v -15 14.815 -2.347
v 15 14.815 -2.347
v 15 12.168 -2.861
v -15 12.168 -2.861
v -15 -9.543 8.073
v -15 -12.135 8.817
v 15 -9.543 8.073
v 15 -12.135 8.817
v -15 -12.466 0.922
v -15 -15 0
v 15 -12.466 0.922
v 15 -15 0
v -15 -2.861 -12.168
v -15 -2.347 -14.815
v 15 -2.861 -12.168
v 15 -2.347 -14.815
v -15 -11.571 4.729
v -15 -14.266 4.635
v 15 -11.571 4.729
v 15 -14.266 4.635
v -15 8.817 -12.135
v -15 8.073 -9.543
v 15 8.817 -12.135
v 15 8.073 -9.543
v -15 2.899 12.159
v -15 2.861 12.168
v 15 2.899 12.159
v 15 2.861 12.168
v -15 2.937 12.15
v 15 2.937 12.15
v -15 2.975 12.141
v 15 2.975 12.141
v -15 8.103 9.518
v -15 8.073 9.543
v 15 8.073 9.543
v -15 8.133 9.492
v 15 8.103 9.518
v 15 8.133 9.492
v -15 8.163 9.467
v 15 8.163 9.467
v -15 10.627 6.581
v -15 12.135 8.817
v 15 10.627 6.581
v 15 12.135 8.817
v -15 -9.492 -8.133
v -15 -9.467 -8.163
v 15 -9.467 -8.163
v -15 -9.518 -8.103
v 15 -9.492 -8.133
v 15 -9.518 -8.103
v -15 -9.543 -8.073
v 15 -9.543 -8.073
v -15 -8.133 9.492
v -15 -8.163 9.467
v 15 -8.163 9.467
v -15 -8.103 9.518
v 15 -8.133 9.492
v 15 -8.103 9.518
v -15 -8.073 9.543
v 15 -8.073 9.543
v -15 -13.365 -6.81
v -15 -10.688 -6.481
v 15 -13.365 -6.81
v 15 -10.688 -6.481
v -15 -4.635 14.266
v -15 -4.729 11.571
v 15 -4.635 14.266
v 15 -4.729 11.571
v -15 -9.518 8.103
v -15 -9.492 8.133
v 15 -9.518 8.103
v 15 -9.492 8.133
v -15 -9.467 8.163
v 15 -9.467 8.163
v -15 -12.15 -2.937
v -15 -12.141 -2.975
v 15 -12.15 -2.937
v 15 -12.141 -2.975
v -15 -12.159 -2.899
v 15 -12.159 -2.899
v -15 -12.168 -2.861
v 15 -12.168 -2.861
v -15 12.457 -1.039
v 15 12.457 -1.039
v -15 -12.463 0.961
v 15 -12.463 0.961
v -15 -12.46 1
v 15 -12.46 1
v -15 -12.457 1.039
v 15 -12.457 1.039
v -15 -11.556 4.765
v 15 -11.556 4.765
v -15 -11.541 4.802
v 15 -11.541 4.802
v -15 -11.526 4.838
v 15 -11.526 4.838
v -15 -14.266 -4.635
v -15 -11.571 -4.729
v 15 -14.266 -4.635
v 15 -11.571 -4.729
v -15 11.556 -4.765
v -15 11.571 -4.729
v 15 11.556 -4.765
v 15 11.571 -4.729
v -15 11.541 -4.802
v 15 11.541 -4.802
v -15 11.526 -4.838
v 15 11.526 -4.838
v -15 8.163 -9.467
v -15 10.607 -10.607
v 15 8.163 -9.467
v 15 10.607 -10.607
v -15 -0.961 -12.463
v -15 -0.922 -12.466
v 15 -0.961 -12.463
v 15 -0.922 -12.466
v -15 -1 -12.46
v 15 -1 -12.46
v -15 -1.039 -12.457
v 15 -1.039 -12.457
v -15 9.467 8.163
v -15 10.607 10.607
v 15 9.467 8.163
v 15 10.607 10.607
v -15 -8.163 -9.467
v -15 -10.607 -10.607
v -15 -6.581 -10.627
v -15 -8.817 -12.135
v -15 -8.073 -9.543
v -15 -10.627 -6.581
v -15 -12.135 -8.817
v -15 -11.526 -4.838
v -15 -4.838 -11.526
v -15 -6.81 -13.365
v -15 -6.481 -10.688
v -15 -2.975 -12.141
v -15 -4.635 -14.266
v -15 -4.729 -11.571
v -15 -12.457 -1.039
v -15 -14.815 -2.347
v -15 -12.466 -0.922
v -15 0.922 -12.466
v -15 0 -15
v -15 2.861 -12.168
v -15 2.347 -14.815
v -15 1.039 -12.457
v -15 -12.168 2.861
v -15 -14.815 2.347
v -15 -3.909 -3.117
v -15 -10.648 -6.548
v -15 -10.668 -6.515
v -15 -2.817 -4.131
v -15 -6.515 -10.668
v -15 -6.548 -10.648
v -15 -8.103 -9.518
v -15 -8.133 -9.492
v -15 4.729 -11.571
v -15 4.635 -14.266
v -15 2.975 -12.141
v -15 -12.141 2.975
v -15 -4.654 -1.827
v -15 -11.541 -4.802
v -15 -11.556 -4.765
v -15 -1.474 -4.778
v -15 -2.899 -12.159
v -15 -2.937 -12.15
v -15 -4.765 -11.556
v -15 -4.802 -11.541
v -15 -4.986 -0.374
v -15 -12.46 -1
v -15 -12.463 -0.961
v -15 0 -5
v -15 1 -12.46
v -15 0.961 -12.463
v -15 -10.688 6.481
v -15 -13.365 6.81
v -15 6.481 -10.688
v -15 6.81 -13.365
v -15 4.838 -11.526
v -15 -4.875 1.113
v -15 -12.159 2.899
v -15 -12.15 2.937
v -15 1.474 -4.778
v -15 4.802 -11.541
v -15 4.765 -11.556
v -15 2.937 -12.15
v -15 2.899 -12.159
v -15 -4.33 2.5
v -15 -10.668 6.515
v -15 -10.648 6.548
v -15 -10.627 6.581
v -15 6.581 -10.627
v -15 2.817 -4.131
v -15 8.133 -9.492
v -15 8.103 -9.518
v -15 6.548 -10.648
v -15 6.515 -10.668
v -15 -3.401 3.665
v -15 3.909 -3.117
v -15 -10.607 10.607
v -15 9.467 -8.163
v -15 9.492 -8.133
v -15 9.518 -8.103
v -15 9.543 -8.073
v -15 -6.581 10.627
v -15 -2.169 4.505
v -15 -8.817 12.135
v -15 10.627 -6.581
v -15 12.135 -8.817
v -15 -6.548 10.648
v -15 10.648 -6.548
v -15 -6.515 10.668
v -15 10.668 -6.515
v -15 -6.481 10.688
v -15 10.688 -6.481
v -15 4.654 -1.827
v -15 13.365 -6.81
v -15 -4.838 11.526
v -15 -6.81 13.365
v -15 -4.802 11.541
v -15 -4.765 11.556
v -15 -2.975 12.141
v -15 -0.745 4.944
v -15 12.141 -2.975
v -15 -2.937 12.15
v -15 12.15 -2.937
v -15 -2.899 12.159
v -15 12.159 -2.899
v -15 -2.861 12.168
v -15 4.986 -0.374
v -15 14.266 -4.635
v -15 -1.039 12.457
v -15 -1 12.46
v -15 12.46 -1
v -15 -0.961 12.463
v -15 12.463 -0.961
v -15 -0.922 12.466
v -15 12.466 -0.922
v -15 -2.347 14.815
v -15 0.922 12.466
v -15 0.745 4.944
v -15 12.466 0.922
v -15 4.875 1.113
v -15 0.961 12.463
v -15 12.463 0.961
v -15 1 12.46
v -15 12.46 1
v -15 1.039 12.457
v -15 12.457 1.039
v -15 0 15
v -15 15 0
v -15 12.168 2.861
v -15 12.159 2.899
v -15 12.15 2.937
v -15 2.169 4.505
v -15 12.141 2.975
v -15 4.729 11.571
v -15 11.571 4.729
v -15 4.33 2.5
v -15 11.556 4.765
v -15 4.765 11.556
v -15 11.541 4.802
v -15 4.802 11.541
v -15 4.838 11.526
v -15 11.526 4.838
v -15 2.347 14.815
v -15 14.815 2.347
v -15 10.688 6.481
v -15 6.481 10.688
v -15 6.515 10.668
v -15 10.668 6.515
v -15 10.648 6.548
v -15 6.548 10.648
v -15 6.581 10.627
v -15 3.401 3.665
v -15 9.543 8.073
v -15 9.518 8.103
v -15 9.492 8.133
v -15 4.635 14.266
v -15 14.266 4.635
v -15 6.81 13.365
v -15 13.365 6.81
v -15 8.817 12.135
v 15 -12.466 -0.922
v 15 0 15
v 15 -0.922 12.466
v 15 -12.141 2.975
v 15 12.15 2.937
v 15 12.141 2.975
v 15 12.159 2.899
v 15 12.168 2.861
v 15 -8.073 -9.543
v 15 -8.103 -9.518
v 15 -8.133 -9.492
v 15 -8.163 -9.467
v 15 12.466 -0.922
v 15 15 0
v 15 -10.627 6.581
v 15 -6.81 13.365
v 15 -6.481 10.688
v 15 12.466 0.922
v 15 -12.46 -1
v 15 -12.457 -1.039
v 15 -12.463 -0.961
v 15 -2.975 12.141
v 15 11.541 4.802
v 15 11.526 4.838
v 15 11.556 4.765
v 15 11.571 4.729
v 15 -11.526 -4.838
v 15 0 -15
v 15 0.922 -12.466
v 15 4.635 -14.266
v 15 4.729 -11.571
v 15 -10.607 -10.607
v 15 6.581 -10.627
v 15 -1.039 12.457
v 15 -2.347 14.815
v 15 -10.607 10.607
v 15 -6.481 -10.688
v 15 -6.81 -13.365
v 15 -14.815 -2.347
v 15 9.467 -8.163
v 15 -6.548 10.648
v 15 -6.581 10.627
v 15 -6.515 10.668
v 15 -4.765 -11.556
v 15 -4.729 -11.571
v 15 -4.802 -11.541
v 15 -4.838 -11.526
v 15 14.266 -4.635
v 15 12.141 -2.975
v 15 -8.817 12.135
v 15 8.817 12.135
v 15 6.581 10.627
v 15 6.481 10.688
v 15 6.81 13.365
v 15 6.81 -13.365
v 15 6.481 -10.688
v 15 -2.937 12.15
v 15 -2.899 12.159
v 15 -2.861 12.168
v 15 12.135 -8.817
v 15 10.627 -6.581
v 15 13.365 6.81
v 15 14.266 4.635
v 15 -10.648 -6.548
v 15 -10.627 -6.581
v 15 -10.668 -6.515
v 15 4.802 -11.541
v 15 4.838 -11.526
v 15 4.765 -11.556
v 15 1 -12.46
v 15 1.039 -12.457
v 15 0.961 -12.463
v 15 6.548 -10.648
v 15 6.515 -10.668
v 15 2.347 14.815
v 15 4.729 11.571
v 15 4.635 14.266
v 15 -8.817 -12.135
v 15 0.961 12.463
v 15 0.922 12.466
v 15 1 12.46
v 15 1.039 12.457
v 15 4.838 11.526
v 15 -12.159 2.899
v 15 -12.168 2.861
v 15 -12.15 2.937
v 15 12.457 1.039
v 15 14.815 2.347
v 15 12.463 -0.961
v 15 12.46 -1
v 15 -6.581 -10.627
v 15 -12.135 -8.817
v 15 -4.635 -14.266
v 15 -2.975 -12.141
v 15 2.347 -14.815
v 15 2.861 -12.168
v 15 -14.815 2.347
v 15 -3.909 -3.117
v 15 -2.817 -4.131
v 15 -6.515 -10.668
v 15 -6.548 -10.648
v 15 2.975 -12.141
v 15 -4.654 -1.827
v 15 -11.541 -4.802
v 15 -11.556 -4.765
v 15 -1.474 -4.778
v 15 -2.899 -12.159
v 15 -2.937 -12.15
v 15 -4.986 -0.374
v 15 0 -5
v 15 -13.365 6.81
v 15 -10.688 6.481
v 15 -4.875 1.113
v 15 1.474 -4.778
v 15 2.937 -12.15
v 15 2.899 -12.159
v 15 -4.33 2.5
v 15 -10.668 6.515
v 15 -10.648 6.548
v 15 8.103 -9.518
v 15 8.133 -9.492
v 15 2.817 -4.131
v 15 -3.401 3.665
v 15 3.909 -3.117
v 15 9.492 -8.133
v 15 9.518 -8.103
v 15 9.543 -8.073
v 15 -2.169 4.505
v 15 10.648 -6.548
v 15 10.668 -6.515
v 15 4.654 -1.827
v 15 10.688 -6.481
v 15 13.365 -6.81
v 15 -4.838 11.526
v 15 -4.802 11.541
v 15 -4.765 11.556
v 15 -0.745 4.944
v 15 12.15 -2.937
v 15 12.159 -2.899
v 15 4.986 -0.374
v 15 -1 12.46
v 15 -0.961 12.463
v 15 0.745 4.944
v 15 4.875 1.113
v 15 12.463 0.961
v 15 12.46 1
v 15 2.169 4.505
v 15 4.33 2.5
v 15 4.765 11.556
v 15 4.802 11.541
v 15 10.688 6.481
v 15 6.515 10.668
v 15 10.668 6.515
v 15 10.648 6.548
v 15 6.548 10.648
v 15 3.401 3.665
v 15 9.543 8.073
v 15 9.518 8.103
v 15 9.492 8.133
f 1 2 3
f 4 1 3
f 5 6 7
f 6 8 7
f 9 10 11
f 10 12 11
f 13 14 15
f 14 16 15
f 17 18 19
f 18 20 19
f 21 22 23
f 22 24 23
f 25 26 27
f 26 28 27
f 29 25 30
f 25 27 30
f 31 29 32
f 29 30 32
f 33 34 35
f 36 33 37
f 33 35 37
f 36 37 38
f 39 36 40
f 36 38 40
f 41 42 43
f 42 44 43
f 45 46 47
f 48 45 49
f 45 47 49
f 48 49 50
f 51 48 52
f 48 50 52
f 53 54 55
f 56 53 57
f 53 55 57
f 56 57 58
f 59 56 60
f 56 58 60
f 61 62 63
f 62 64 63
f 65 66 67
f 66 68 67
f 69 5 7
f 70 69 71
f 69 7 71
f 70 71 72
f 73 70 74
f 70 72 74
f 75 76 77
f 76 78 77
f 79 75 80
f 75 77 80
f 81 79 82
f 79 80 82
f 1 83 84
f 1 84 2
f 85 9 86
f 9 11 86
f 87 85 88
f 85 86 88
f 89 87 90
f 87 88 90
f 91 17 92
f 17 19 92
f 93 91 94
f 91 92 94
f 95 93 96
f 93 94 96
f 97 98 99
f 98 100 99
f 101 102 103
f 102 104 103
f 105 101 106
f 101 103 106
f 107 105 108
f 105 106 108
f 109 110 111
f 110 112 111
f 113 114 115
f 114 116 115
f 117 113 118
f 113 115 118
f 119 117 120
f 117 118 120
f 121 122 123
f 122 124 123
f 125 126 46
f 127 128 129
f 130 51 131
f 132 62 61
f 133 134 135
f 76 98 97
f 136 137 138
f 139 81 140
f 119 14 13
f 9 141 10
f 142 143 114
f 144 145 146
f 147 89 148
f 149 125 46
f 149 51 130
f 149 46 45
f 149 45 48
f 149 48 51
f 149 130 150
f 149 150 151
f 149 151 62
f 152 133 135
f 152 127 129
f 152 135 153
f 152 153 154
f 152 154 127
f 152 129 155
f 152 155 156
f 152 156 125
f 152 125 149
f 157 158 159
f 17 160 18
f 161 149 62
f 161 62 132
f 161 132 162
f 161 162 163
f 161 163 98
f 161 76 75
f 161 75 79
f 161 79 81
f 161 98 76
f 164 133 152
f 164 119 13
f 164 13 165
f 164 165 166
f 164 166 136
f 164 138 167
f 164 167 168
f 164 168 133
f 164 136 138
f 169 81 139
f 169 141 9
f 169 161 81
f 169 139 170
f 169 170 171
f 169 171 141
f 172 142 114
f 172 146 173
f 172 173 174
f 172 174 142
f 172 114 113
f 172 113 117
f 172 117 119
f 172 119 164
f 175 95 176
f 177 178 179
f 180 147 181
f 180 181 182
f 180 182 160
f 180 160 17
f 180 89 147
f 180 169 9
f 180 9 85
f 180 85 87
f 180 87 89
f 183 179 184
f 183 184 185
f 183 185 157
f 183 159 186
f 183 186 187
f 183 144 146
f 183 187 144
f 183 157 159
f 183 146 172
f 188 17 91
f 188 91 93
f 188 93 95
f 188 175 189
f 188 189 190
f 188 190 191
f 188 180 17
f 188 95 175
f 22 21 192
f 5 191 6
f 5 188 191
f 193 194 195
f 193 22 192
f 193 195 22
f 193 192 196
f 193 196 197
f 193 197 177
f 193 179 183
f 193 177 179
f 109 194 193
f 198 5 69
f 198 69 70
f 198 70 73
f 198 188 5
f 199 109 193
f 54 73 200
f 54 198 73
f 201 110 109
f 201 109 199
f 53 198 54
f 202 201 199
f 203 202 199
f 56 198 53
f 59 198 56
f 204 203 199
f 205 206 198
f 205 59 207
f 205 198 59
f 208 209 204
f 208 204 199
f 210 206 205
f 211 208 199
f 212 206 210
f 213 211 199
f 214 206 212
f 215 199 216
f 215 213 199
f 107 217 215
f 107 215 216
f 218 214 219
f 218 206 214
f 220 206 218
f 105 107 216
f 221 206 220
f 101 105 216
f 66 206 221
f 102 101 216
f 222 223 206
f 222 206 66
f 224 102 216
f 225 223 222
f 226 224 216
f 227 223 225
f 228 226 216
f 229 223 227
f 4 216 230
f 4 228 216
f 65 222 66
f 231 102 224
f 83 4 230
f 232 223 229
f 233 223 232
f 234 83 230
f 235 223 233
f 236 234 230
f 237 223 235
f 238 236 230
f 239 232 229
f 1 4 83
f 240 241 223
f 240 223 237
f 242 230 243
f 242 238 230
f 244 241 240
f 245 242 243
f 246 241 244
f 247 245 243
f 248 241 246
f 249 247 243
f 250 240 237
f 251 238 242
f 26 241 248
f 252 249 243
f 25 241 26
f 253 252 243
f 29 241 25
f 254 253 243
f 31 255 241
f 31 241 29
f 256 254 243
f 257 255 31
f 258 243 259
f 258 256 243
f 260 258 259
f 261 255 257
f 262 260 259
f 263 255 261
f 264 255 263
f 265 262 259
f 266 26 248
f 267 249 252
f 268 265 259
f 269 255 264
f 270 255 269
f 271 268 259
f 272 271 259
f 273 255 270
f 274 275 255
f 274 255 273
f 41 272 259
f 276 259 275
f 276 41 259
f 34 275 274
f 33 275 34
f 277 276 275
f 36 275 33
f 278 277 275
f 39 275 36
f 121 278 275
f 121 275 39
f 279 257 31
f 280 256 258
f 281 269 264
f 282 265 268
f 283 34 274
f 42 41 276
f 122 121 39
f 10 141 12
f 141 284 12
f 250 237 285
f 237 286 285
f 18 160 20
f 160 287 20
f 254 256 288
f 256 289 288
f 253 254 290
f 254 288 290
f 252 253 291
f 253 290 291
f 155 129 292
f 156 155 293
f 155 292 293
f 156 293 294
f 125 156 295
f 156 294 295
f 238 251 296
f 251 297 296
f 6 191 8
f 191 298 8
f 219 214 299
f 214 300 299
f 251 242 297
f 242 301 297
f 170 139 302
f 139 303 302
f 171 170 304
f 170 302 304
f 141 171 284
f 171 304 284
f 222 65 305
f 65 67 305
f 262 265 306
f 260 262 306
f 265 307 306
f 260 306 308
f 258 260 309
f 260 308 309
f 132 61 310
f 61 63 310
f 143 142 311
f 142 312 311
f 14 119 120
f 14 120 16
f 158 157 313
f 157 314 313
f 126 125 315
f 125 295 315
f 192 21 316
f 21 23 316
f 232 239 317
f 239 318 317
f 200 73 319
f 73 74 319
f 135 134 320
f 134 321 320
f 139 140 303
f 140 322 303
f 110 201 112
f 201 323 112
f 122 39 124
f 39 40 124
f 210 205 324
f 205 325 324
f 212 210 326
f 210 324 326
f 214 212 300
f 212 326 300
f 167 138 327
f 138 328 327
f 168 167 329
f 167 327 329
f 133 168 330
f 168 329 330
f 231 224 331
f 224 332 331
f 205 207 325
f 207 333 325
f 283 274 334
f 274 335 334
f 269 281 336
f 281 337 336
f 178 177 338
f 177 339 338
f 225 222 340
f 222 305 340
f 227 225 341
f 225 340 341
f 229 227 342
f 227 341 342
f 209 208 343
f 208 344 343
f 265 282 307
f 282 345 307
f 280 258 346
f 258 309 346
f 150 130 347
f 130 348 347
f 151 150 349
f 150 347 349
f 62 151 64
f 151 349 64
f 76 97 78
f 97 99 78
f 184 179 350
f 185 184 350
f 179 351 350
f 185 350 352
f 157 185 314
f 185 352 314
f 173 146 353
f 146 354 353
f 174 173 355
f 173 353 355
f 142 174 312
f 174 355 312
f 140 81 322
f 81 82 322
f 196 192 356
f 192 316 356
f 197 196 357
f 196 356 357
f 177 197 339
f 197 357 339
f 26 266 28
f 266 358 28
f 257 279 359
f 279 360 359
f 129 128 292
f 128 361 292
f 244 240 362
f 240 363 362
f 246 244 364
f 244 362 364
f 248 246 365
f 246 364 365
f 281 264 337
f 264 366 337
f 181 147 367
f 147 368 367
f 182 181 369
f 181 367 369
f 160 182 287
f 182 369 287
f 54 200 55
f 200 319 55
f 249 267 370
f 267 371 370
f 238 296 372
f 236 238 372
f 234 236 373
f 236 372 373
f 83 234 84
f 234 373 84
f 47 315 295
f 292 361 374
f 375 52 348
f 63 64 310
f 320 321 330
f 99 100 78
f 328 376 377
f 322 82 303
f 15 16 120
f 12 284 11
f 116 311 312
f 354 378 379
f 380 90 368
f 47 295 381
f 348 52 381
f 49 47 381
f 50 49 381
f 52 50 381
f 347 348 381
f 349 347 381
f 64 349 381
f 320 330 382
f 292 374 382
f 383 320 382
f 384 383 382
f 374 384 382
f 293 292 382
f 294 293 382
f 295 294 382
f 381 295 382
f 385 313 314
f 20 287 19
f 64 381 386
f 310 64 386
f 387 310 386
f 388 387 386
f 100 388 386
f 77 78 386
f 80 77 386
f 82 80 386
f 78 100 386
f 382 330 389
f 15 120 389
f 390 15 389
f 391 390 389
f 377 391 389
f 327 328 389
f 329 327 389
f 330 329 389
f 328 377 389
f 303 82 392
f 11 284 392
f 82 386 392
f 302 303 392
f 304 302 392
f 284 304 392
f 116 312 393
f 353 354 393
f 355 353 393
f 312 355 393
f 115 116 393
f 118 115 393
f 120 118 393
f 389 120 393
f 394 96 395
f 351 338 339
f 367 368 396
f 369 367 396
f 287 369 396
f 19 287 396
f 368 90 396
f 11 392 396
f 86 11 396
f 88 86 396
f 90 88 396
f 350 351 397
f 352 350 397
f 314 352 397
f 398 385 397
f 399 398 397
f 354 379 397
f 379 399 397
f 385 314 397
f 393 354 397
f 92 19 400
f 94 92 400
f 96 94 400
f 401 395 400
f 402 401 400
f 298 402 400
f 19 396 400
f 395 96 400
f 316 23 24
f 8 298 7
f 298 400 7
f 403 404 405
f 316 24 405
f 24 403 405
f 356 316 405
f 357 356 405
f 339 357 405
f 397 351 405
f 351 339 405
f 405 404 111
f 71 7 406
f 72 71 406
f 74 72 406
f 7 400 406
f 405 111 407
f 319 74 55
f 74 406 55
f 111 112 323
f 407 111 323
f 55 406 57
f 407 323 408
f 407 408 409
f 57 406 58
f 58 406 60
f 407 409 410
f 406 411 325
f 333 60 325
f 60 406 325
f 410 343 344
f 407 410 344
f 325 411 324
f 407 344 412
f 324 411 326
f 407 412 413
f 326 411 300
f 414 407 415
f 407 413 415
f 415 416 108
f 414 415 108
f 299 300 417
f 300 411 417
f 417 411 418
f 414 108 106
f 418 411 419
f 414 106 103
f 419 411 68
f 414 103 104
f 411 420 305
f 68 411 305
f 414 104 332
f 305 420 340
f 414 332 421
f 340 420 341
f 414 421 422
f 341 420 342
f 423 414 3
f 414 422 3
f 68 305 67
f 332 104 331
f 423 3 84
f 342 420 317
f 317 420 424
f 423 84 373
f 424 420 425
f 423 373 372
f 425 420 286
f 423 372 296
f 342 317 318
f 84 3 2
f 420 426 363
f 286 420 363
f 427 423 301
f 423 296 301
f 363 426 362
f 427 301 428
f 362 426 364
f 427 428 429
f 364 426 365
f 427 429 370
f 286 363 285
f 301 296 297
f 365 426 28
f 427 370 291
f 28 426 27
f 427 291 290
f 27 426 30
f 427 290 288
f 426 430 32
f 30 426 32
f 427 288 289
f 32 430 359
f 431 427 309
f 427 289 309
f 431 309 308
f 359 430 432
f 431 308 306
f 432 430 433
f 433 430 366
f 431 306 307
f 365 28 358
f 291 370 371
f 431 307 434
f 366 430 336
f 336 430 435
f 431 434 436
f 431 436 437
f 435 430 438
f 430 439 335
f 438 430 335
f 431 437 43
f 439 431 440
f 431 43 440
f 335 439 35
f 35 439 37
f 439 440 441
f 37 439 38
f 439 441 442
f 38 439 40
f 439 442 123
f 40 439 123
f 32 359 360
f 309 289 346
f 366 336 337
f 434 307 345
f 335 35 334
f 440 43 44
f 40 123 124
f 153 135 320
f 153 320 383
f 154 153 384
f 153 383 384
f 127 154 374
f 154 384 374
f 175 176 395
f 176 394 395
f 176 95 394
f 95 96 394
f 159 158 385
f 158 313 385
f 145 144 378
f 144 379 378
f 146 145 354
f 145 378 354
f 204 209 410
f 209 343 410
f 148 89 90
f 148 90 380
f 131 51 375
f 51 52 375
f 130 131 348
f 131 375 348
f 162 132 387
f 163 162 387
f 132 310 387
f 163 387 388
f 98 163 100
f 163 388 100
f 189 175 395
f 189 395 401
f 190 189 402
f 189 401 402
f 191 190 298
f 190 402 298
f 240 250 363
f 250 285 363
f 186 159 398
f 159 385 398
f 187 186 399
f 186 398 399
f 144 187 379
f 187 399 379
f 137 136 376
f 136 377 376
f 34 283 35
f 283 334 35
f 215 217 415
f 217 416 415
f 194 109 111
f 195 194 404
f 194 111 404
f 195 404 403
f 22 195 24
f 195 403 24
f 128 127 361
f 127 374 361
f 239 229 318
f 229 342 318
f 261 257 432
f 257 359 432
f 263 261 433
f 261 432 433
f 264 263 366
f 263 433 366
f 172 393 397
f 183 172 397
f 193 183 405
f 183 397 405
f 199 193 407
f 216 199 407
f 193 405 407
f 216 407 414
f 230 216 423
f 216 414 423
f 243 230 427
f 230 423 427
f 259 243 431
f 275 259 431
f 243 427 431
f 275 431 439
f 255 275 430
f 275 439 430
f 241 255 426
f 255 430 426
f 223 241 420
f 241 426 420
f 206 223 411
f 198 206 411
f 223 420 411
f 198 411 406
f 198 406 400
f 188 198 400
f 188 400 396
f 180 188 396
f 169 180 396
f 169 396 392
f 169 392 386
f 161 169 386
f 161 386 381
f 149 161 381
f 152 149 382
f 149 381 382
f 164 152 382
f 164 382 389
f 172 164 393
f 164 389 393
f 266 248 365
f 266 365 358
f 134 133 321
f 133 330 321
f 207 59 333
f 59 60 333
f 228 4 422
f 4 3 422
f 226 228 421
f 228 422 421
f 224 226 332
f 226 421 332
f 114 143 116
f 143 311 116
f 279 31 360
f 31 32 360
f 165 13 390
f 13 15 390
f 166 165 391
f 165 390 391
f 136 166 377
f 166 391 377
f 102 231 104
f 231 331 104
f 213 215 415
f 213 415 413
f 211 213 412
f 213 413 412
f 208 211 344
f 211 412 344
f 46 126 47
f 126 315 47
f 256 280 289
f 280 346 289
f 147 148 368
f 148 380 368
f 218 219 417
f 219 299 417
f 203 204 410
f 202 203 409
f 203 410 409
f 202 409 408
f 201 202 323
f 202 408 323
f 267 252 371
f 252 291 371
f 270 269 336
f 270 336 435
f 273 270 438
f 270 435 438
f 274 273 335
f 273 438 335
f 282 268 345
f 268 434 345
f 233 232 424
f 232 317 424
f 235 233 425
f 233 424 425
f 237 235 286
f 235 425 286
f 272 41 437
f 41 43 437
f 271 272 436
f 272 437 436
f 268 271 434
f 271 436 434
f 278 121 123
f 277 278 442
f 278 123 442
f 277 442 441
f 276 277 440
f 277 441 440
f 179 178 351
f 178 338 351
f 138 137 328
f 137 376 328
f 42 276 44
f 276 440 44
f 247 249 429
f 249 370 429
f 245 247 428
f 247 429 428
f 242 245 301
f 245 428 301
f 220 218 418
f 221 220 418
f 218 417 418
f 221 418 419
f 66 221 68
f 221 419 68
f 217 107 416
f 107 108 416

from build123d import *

# Parameters (mm, degrees)
BOSS_EXTRUDE1_DEPTH = 15
SKETCH2_R           = 5
CUT_EXTRUDE2_DEPTH  = 30


with BuildPart() as part:
    # Sketch1 → Boss-Extrude1 (new, symmetric)
    with BuildSketch(Plane(origin=(0, 0, 0), x_dir=(0, 0, -1), z_dir=(1, 0, 0))):
        with BuildLine():
            Line((2.346516976, 14.815325109), (2.861072583, 12.168165995))
            ThreePointArc((2.861072583, 12.168165995), (2.918067048, 12.154624005), (2.974997424, 12.14081506))
            Line((2.974997424, 12.14081506), (4.635254916, 14.265847744))
            Line((4.635254916, 14.265847744), (4.729368569, 11.570785321))
            ThreePointArc((4.729368569, 11.570785321), (4.783542905, 11.548494156), (4.837612178, 11.52594935))
            Line((4.837612178, 11.52594935), (6.809857496, 13.365097863))
            Line((6.809857496, 13.365097863), (6.481211806, 10.688493511))
            ThreePointArc((6.481211806, 10.688493511), (6.531232059, 10.658002054), (6.581108865, 10.627276514))
            Line((6.581108865, 10.627276514), (8.816778784, 12.135254916))
            Line((8.816778784, 12.135254916), (8.073466098, 9.543015517))
            ThreePointArc((8.073466098, 9.543015517), (8.118100604, 9.50507457), (8.16255681, 9.466924861))
            Line((8.16255681, 9.466924861), (10.606601718, 10.606601718))
            Line((10.606601718, 10.606601718), (9.466924861, 8.16255681))
            ThreePointArc((9.466924861, 8.16255681), (9.50507457, 8.118100604), (9.543015517, 8.073466098))
            Line((9.543015517, 8.073466098), (12.135254916, 8.816778784))
            Line((12.135254916, 8.816778784), (10.627276514, 6.581108865))
            ThreePointArc((10.627276514, 6.581108865), (10.658002054, 6.531232059), (10.688493511, 6.481211806))
            Line((10.688493511, 6.481211806), (13.365097863, 6.809857496))
            Line((13.365097863, 6.809857496), (11.52594935, 4.837612178))
            ThreePointArc((11.52594935, 4.837612178), (11.548494156, 4.783542905), (11.570785321, 4.729368569))
            Line((11.570785321, 4.729368569), (14.265847744, 4.635254916))
            Line((14.265847744, 4.635254916), (12.14081506, 2.974997424))
            ThreePointArc((12.14081506, 2.974997424), (12.154624005, 2.918067048), (12.168165995, 2.861072583))
            Line((12.168165995, 2.861072583), (14.815325109, 2.346516976))
            Line((14.815325109, 2.346516976), (12.456733611, 1.03912836))
            ThreePointArc((12.456733611, 1.03912836), (12.461466672, 0.980738697), (12.465926038, 0.922327493))
            Line((12.465926038, 0.922327493), (15, 0))
            Line((15, 0), (12.465926038, -0.922327493))
            ThreePointArc((12.465926038, -0.922327493), (12.461466672, -0.980738697), (12.456733611, -1.03912836))
            Line((12.456733611, -1.03912836), (14.815325109, -2.346516976))
            Line((14.815325109, -2.346516976), (12.168165995, -2.861072583))
            ThreePointArc((12.168165995, -2.861072583), (12.154624005, -2.918067048), (12.14081506, -2.974997424))
            Line((12.14081506, -2.974997424), (14.265847744, -4.635254916))
            Line((14.265847744, -4.635254916), (11.570785321, -4.729368569))
            ThreePointArc((11.570785321, -4.729368569), (11.548494156, -4.783542905), (11.52594935, -4.837612178))
            Line((11.52594935, -4.837612178), (13.365097863, -6.809857496))
            Line((13.365097863, -6.809857496), (10.688493511, -6.481211806))
            ThreePointArc((10.688493511, -6.481211806), (10.658002054, -6.531232059), (10.627276514, -6.581108865))
            Line((10.627276514, -6.581108865), (12.135254916, -8.816778784))
            Line((12.135254916, -8.816778784), (9.543015517, -8.073466098))
            ThreePointArc((9.543015517, -8.073466098), (9.50507457, -8.118100604), (9.466924861, -8.16255681))
            Line((9.466924861, -8.16255681), (10.606601718, -10.606601718))
            Line((10.606601718, -10.606601718), (8.16255681, -9.466924861))
            ThreePointArc((8.16255681, -9.466924861), (8.118100604, -9.50507457), (8.073466098, -9.543015517))
            Line((8.073466098, -9.543015517), (8.816778784, -12.135254916))
            Line((8.816778784, -12.135254916), (6.581108865, -10.627276514))
            ThreePointArc((6.581108865, -10.627276514), (6.531232059, -10.658002054), (6.481211806, -10.688493511))
            Line((6.481211806, -10.688493511), (6.809857496, -13.365097863))
            Line((6.809857496, -13.365097863), (4.837612178, -11.52594935))
            ThreePointArc((4.837612178, -11.52594935), (4.783542905, -11.548494156), (4.729368569, -11.570785321))
            Line((4.729368569, -11.570785321), (4.635254916, -14.265847744))
            Line((4.635254916, -14.265847744), (2.974997424, -12.14081506))
            ThreePointArc((2.974997424, -12.14081506), (2.918067048, -12.154624005), (2.861072583, -12.168165995))
            Line((2.861072583, -12.168165995), (2.346516976, -14.815325109))
            Line((2.346516976, -14.815325109), (1.03912836, -12.456733611))
            ThreePointArc((1.03912836, -12.456733611), (0.980738697, -12.461466672), (0.922327493, -12.465926038))
            Line((0.922327493, -12.465926038), (0, -15))
            Line((0, -15), (-0.922327493, -12.465926038))
            ThreePointArc((-0.922327493, -12.465926038), (-0.980738697, -12.461466672), (-1.03912836, -12.456733611))
            Line((-1.03912836, -12.456733611), (-2.346516976, -14.815325109))
            Line((-2.346516976, -14.815325109), (-2.861072583, -12.168165995))
            ThreePointArc((-2.861072583, -12.168165995), (-2.918067048, -12.154624005), (-2.974997424, -12.14081506))
            Line((-2.974997424, -12.14081506), (-4.635254916, -14.265847744))
            Line((-4.635254916, -14.265847744), (-4.729368569, -11.570785321))
            ThreePointArc((-4.729368569, -11.570785321), (-4.783542905, -11.548494156), (-4.837612178, -11.52594935))
            Line((-4.837612178, -11.52594935), (-6.809857496, -13.365097863))
            Line((-6.809857496, -13.365097863), (-6.481211806, -10.688493511))
            ThreePointArc((-6.481211806, -10.688493511), (-6.531232059, -10.658002054), (-6.581108865, -10.627276514))
            Line((-6.581108865, -10.627276514), (-8.816778784, -12.135254916))
            Line((-8.816778784, -12.135254916), (-8.073466098, -9.543015517))
            ThreePointArc((-8.073466098, -9.543015517), (-8.118100604, -9.50507457), (-8.16255681, -9.466924861))
            Line((-8.16255681, -9.466924861), (-10.606601718, -10.606601718))
            Line((-10.606601718, -10.606601718), (-9.466924861, -8.16255681))
            ThreePointArc((-9.466924861, -8.16255681), (-9.50507457, -8.118100604), (-9.543015517, -8.073466098))
            Line((-9.543015517, -8.073466098), (-12.135254916, -8.816778784))
            Line((-12.135254916, -8.816778784), (-10.627276514, -6.581108865))
            ThreePointArc((-10.627276514, -6.581108865), (-10.658002054, -6.531232059), (-10.688493511, -6.481211806))
            Line((-10.688493511, -6.481211806), (-13.365097863, -6.809857496))
            Line((-13.365097863, -6.809857496), (-11.52594935, -4.837612178))
            ThreePointArc((-11.52594935, -4.837612178), (-11.548494156, -4.783542905), (-11.570785321, -4.729368569))
            Line((-11.570785321, -4.729368569), (-14.265847744, -4.635254916))
            Line((-14.265847744, -4.635254916), (-12.14081506, -2.974997424))
            ThreePointArc((-12.14081506, -2.974997424), (-12.154624005, -2.918067048), (-12.168165995, -2.861072583))
            Line((-12.168165995, -2.861072583), (-14.815325109, -2.346516976))
            Line((-14.815325109, -2.346516976), (-12.456733611, -1.03912836))
            ThreePointArc((-12.456733611, -1.03912836), (-12.461466672, -0.980738697), (-12.465926038, -0.922327493))
            Line((-12.465926038, -0.922327493), (-15, 0))
            Line((-15, 0), (-12.465926038, 0.922327493))
            ThreePointArc((-12.465926038, 0.922327493), (-12.461466672, 0.980738697), (-12.456733611, 1.03912836))
            Line((-12.456733611, 1.03912836), (-14.815325109, 2.346516976))
            Line((-14.815325109, 2.346516976), (-12.168165995, 2.861072583))
            ThreePointArc((-12.168165995, 2.861072583), (-12.154624005, 2.918067048), (-12.14081506, 2.974997424))
            Line((-12.14081506, 2.974997424), (-14.265847744, 4.635254916))
            Line((-14.265847744, 4.635254916), (-11.570785321, 4.729368569))
            ThreePointArc((-11.570785321, 4.729368569), (-11.548494156, 4.783542905), (-11.52594935, 4.837612178))
            Line((-11.52594935, 4.837612178), (-13.365097863, 6.809857496))
            Line((-13.365097863, 6.809857496), (-10.688493511, 6.481211806))
            ThreePointArc((-10.688493511, 6.481211806), (-10.658002054, 6.531232059), (-10.627276514, 6.581108865))
            Line((-10.627276514, 6.581108865), (-12.135254916, 8.816778784))
            Line((-12.135254916, 8.816778784), (-9.543015517, 8.073466098))
            ThreePointArc((-9.543015517, 8.073466098), (-9.50507457, 8.118100604), (-9.466924861, 8.16255681))
            Line((-9.466924861, 8.16255681), (-10.606601718, 10.606601718))
            Line((-10.606601718, 10.606601718), (-8.16255681, 9.466924861))
            ThreePointArc((-8.16255681, 9.466924861), (-8.118100604, 9.50507457), (-8.073466098, 9.543015517))
            Line((-8.073466098, 9.543015517), (-8.816778784, 12.135254916))
            Line((-8.816778784, 12.135254916), (-6.581108865, 10.627276514))
            ThreePointArc((-6.581108865, 10.627276514), (-6.531232059, 10.658002054), (-6.481211806, 10.688493511))
            Line((-6.481211806, 10.688493511), (-6.809857496, 13.365097863))
            Line((-6.809857496, 13.365097863), (-4.837612178, 11.52594935))
            ThreePointArc((-4.837612178, 11.52594935), (-4.783542905, 11.548494156), (-4.729368569, 11.570785321))
            Line((-4.729368569, 11.570785321), (-4.635254916, 14.265847744))
            Line((-4.635254916, 14.265847744), (-2.974997424, 12.14081506))
            ThreePointArc((-2.974997424, 12.14081506), (-2.918067048, 12.154624005), (-2.861072583, 12.168165995))
            Line((-2.861072583, 12.168165995), (-2.346516976, 14.815325109))
            Line((-2.346516976, 14.815325109), (-1.03912836, 12.456733611))
            ThreePointArc((-1.03912836, 12.456733611), (-0.980738697, 12.461466672), (-0.922327493, 12.465926038))
            Line((-0.922327493, 12.465926038), (0, 15))
            Line((0, 15), (0.922327493, 12.465926038))
            ThreePointArc((0.922327493, 12.465926038), (0.980738697, 12.461466672), (1.03912836, 12.456733611))
            Line((1.03912836, 12.456733611), (2.346516976, 14.815325109))
        make_face()
    extrude(amount=BOSS_EXTRUDE1_DEPTH, both=True)

    # Sketch2 → Cut-Extrude2 (cut)
    with BuildSketch(Plane(origin=(15, 0, 0), x_dir=(0, 0, -1), z_dir=(1, 0, 0))):
        Circle(SKETCH2_R)
    extrude(amount=-CUT_EXTRUDE2_DEPTH, mode=Mode.SUBTRACT)


solid = part.part
